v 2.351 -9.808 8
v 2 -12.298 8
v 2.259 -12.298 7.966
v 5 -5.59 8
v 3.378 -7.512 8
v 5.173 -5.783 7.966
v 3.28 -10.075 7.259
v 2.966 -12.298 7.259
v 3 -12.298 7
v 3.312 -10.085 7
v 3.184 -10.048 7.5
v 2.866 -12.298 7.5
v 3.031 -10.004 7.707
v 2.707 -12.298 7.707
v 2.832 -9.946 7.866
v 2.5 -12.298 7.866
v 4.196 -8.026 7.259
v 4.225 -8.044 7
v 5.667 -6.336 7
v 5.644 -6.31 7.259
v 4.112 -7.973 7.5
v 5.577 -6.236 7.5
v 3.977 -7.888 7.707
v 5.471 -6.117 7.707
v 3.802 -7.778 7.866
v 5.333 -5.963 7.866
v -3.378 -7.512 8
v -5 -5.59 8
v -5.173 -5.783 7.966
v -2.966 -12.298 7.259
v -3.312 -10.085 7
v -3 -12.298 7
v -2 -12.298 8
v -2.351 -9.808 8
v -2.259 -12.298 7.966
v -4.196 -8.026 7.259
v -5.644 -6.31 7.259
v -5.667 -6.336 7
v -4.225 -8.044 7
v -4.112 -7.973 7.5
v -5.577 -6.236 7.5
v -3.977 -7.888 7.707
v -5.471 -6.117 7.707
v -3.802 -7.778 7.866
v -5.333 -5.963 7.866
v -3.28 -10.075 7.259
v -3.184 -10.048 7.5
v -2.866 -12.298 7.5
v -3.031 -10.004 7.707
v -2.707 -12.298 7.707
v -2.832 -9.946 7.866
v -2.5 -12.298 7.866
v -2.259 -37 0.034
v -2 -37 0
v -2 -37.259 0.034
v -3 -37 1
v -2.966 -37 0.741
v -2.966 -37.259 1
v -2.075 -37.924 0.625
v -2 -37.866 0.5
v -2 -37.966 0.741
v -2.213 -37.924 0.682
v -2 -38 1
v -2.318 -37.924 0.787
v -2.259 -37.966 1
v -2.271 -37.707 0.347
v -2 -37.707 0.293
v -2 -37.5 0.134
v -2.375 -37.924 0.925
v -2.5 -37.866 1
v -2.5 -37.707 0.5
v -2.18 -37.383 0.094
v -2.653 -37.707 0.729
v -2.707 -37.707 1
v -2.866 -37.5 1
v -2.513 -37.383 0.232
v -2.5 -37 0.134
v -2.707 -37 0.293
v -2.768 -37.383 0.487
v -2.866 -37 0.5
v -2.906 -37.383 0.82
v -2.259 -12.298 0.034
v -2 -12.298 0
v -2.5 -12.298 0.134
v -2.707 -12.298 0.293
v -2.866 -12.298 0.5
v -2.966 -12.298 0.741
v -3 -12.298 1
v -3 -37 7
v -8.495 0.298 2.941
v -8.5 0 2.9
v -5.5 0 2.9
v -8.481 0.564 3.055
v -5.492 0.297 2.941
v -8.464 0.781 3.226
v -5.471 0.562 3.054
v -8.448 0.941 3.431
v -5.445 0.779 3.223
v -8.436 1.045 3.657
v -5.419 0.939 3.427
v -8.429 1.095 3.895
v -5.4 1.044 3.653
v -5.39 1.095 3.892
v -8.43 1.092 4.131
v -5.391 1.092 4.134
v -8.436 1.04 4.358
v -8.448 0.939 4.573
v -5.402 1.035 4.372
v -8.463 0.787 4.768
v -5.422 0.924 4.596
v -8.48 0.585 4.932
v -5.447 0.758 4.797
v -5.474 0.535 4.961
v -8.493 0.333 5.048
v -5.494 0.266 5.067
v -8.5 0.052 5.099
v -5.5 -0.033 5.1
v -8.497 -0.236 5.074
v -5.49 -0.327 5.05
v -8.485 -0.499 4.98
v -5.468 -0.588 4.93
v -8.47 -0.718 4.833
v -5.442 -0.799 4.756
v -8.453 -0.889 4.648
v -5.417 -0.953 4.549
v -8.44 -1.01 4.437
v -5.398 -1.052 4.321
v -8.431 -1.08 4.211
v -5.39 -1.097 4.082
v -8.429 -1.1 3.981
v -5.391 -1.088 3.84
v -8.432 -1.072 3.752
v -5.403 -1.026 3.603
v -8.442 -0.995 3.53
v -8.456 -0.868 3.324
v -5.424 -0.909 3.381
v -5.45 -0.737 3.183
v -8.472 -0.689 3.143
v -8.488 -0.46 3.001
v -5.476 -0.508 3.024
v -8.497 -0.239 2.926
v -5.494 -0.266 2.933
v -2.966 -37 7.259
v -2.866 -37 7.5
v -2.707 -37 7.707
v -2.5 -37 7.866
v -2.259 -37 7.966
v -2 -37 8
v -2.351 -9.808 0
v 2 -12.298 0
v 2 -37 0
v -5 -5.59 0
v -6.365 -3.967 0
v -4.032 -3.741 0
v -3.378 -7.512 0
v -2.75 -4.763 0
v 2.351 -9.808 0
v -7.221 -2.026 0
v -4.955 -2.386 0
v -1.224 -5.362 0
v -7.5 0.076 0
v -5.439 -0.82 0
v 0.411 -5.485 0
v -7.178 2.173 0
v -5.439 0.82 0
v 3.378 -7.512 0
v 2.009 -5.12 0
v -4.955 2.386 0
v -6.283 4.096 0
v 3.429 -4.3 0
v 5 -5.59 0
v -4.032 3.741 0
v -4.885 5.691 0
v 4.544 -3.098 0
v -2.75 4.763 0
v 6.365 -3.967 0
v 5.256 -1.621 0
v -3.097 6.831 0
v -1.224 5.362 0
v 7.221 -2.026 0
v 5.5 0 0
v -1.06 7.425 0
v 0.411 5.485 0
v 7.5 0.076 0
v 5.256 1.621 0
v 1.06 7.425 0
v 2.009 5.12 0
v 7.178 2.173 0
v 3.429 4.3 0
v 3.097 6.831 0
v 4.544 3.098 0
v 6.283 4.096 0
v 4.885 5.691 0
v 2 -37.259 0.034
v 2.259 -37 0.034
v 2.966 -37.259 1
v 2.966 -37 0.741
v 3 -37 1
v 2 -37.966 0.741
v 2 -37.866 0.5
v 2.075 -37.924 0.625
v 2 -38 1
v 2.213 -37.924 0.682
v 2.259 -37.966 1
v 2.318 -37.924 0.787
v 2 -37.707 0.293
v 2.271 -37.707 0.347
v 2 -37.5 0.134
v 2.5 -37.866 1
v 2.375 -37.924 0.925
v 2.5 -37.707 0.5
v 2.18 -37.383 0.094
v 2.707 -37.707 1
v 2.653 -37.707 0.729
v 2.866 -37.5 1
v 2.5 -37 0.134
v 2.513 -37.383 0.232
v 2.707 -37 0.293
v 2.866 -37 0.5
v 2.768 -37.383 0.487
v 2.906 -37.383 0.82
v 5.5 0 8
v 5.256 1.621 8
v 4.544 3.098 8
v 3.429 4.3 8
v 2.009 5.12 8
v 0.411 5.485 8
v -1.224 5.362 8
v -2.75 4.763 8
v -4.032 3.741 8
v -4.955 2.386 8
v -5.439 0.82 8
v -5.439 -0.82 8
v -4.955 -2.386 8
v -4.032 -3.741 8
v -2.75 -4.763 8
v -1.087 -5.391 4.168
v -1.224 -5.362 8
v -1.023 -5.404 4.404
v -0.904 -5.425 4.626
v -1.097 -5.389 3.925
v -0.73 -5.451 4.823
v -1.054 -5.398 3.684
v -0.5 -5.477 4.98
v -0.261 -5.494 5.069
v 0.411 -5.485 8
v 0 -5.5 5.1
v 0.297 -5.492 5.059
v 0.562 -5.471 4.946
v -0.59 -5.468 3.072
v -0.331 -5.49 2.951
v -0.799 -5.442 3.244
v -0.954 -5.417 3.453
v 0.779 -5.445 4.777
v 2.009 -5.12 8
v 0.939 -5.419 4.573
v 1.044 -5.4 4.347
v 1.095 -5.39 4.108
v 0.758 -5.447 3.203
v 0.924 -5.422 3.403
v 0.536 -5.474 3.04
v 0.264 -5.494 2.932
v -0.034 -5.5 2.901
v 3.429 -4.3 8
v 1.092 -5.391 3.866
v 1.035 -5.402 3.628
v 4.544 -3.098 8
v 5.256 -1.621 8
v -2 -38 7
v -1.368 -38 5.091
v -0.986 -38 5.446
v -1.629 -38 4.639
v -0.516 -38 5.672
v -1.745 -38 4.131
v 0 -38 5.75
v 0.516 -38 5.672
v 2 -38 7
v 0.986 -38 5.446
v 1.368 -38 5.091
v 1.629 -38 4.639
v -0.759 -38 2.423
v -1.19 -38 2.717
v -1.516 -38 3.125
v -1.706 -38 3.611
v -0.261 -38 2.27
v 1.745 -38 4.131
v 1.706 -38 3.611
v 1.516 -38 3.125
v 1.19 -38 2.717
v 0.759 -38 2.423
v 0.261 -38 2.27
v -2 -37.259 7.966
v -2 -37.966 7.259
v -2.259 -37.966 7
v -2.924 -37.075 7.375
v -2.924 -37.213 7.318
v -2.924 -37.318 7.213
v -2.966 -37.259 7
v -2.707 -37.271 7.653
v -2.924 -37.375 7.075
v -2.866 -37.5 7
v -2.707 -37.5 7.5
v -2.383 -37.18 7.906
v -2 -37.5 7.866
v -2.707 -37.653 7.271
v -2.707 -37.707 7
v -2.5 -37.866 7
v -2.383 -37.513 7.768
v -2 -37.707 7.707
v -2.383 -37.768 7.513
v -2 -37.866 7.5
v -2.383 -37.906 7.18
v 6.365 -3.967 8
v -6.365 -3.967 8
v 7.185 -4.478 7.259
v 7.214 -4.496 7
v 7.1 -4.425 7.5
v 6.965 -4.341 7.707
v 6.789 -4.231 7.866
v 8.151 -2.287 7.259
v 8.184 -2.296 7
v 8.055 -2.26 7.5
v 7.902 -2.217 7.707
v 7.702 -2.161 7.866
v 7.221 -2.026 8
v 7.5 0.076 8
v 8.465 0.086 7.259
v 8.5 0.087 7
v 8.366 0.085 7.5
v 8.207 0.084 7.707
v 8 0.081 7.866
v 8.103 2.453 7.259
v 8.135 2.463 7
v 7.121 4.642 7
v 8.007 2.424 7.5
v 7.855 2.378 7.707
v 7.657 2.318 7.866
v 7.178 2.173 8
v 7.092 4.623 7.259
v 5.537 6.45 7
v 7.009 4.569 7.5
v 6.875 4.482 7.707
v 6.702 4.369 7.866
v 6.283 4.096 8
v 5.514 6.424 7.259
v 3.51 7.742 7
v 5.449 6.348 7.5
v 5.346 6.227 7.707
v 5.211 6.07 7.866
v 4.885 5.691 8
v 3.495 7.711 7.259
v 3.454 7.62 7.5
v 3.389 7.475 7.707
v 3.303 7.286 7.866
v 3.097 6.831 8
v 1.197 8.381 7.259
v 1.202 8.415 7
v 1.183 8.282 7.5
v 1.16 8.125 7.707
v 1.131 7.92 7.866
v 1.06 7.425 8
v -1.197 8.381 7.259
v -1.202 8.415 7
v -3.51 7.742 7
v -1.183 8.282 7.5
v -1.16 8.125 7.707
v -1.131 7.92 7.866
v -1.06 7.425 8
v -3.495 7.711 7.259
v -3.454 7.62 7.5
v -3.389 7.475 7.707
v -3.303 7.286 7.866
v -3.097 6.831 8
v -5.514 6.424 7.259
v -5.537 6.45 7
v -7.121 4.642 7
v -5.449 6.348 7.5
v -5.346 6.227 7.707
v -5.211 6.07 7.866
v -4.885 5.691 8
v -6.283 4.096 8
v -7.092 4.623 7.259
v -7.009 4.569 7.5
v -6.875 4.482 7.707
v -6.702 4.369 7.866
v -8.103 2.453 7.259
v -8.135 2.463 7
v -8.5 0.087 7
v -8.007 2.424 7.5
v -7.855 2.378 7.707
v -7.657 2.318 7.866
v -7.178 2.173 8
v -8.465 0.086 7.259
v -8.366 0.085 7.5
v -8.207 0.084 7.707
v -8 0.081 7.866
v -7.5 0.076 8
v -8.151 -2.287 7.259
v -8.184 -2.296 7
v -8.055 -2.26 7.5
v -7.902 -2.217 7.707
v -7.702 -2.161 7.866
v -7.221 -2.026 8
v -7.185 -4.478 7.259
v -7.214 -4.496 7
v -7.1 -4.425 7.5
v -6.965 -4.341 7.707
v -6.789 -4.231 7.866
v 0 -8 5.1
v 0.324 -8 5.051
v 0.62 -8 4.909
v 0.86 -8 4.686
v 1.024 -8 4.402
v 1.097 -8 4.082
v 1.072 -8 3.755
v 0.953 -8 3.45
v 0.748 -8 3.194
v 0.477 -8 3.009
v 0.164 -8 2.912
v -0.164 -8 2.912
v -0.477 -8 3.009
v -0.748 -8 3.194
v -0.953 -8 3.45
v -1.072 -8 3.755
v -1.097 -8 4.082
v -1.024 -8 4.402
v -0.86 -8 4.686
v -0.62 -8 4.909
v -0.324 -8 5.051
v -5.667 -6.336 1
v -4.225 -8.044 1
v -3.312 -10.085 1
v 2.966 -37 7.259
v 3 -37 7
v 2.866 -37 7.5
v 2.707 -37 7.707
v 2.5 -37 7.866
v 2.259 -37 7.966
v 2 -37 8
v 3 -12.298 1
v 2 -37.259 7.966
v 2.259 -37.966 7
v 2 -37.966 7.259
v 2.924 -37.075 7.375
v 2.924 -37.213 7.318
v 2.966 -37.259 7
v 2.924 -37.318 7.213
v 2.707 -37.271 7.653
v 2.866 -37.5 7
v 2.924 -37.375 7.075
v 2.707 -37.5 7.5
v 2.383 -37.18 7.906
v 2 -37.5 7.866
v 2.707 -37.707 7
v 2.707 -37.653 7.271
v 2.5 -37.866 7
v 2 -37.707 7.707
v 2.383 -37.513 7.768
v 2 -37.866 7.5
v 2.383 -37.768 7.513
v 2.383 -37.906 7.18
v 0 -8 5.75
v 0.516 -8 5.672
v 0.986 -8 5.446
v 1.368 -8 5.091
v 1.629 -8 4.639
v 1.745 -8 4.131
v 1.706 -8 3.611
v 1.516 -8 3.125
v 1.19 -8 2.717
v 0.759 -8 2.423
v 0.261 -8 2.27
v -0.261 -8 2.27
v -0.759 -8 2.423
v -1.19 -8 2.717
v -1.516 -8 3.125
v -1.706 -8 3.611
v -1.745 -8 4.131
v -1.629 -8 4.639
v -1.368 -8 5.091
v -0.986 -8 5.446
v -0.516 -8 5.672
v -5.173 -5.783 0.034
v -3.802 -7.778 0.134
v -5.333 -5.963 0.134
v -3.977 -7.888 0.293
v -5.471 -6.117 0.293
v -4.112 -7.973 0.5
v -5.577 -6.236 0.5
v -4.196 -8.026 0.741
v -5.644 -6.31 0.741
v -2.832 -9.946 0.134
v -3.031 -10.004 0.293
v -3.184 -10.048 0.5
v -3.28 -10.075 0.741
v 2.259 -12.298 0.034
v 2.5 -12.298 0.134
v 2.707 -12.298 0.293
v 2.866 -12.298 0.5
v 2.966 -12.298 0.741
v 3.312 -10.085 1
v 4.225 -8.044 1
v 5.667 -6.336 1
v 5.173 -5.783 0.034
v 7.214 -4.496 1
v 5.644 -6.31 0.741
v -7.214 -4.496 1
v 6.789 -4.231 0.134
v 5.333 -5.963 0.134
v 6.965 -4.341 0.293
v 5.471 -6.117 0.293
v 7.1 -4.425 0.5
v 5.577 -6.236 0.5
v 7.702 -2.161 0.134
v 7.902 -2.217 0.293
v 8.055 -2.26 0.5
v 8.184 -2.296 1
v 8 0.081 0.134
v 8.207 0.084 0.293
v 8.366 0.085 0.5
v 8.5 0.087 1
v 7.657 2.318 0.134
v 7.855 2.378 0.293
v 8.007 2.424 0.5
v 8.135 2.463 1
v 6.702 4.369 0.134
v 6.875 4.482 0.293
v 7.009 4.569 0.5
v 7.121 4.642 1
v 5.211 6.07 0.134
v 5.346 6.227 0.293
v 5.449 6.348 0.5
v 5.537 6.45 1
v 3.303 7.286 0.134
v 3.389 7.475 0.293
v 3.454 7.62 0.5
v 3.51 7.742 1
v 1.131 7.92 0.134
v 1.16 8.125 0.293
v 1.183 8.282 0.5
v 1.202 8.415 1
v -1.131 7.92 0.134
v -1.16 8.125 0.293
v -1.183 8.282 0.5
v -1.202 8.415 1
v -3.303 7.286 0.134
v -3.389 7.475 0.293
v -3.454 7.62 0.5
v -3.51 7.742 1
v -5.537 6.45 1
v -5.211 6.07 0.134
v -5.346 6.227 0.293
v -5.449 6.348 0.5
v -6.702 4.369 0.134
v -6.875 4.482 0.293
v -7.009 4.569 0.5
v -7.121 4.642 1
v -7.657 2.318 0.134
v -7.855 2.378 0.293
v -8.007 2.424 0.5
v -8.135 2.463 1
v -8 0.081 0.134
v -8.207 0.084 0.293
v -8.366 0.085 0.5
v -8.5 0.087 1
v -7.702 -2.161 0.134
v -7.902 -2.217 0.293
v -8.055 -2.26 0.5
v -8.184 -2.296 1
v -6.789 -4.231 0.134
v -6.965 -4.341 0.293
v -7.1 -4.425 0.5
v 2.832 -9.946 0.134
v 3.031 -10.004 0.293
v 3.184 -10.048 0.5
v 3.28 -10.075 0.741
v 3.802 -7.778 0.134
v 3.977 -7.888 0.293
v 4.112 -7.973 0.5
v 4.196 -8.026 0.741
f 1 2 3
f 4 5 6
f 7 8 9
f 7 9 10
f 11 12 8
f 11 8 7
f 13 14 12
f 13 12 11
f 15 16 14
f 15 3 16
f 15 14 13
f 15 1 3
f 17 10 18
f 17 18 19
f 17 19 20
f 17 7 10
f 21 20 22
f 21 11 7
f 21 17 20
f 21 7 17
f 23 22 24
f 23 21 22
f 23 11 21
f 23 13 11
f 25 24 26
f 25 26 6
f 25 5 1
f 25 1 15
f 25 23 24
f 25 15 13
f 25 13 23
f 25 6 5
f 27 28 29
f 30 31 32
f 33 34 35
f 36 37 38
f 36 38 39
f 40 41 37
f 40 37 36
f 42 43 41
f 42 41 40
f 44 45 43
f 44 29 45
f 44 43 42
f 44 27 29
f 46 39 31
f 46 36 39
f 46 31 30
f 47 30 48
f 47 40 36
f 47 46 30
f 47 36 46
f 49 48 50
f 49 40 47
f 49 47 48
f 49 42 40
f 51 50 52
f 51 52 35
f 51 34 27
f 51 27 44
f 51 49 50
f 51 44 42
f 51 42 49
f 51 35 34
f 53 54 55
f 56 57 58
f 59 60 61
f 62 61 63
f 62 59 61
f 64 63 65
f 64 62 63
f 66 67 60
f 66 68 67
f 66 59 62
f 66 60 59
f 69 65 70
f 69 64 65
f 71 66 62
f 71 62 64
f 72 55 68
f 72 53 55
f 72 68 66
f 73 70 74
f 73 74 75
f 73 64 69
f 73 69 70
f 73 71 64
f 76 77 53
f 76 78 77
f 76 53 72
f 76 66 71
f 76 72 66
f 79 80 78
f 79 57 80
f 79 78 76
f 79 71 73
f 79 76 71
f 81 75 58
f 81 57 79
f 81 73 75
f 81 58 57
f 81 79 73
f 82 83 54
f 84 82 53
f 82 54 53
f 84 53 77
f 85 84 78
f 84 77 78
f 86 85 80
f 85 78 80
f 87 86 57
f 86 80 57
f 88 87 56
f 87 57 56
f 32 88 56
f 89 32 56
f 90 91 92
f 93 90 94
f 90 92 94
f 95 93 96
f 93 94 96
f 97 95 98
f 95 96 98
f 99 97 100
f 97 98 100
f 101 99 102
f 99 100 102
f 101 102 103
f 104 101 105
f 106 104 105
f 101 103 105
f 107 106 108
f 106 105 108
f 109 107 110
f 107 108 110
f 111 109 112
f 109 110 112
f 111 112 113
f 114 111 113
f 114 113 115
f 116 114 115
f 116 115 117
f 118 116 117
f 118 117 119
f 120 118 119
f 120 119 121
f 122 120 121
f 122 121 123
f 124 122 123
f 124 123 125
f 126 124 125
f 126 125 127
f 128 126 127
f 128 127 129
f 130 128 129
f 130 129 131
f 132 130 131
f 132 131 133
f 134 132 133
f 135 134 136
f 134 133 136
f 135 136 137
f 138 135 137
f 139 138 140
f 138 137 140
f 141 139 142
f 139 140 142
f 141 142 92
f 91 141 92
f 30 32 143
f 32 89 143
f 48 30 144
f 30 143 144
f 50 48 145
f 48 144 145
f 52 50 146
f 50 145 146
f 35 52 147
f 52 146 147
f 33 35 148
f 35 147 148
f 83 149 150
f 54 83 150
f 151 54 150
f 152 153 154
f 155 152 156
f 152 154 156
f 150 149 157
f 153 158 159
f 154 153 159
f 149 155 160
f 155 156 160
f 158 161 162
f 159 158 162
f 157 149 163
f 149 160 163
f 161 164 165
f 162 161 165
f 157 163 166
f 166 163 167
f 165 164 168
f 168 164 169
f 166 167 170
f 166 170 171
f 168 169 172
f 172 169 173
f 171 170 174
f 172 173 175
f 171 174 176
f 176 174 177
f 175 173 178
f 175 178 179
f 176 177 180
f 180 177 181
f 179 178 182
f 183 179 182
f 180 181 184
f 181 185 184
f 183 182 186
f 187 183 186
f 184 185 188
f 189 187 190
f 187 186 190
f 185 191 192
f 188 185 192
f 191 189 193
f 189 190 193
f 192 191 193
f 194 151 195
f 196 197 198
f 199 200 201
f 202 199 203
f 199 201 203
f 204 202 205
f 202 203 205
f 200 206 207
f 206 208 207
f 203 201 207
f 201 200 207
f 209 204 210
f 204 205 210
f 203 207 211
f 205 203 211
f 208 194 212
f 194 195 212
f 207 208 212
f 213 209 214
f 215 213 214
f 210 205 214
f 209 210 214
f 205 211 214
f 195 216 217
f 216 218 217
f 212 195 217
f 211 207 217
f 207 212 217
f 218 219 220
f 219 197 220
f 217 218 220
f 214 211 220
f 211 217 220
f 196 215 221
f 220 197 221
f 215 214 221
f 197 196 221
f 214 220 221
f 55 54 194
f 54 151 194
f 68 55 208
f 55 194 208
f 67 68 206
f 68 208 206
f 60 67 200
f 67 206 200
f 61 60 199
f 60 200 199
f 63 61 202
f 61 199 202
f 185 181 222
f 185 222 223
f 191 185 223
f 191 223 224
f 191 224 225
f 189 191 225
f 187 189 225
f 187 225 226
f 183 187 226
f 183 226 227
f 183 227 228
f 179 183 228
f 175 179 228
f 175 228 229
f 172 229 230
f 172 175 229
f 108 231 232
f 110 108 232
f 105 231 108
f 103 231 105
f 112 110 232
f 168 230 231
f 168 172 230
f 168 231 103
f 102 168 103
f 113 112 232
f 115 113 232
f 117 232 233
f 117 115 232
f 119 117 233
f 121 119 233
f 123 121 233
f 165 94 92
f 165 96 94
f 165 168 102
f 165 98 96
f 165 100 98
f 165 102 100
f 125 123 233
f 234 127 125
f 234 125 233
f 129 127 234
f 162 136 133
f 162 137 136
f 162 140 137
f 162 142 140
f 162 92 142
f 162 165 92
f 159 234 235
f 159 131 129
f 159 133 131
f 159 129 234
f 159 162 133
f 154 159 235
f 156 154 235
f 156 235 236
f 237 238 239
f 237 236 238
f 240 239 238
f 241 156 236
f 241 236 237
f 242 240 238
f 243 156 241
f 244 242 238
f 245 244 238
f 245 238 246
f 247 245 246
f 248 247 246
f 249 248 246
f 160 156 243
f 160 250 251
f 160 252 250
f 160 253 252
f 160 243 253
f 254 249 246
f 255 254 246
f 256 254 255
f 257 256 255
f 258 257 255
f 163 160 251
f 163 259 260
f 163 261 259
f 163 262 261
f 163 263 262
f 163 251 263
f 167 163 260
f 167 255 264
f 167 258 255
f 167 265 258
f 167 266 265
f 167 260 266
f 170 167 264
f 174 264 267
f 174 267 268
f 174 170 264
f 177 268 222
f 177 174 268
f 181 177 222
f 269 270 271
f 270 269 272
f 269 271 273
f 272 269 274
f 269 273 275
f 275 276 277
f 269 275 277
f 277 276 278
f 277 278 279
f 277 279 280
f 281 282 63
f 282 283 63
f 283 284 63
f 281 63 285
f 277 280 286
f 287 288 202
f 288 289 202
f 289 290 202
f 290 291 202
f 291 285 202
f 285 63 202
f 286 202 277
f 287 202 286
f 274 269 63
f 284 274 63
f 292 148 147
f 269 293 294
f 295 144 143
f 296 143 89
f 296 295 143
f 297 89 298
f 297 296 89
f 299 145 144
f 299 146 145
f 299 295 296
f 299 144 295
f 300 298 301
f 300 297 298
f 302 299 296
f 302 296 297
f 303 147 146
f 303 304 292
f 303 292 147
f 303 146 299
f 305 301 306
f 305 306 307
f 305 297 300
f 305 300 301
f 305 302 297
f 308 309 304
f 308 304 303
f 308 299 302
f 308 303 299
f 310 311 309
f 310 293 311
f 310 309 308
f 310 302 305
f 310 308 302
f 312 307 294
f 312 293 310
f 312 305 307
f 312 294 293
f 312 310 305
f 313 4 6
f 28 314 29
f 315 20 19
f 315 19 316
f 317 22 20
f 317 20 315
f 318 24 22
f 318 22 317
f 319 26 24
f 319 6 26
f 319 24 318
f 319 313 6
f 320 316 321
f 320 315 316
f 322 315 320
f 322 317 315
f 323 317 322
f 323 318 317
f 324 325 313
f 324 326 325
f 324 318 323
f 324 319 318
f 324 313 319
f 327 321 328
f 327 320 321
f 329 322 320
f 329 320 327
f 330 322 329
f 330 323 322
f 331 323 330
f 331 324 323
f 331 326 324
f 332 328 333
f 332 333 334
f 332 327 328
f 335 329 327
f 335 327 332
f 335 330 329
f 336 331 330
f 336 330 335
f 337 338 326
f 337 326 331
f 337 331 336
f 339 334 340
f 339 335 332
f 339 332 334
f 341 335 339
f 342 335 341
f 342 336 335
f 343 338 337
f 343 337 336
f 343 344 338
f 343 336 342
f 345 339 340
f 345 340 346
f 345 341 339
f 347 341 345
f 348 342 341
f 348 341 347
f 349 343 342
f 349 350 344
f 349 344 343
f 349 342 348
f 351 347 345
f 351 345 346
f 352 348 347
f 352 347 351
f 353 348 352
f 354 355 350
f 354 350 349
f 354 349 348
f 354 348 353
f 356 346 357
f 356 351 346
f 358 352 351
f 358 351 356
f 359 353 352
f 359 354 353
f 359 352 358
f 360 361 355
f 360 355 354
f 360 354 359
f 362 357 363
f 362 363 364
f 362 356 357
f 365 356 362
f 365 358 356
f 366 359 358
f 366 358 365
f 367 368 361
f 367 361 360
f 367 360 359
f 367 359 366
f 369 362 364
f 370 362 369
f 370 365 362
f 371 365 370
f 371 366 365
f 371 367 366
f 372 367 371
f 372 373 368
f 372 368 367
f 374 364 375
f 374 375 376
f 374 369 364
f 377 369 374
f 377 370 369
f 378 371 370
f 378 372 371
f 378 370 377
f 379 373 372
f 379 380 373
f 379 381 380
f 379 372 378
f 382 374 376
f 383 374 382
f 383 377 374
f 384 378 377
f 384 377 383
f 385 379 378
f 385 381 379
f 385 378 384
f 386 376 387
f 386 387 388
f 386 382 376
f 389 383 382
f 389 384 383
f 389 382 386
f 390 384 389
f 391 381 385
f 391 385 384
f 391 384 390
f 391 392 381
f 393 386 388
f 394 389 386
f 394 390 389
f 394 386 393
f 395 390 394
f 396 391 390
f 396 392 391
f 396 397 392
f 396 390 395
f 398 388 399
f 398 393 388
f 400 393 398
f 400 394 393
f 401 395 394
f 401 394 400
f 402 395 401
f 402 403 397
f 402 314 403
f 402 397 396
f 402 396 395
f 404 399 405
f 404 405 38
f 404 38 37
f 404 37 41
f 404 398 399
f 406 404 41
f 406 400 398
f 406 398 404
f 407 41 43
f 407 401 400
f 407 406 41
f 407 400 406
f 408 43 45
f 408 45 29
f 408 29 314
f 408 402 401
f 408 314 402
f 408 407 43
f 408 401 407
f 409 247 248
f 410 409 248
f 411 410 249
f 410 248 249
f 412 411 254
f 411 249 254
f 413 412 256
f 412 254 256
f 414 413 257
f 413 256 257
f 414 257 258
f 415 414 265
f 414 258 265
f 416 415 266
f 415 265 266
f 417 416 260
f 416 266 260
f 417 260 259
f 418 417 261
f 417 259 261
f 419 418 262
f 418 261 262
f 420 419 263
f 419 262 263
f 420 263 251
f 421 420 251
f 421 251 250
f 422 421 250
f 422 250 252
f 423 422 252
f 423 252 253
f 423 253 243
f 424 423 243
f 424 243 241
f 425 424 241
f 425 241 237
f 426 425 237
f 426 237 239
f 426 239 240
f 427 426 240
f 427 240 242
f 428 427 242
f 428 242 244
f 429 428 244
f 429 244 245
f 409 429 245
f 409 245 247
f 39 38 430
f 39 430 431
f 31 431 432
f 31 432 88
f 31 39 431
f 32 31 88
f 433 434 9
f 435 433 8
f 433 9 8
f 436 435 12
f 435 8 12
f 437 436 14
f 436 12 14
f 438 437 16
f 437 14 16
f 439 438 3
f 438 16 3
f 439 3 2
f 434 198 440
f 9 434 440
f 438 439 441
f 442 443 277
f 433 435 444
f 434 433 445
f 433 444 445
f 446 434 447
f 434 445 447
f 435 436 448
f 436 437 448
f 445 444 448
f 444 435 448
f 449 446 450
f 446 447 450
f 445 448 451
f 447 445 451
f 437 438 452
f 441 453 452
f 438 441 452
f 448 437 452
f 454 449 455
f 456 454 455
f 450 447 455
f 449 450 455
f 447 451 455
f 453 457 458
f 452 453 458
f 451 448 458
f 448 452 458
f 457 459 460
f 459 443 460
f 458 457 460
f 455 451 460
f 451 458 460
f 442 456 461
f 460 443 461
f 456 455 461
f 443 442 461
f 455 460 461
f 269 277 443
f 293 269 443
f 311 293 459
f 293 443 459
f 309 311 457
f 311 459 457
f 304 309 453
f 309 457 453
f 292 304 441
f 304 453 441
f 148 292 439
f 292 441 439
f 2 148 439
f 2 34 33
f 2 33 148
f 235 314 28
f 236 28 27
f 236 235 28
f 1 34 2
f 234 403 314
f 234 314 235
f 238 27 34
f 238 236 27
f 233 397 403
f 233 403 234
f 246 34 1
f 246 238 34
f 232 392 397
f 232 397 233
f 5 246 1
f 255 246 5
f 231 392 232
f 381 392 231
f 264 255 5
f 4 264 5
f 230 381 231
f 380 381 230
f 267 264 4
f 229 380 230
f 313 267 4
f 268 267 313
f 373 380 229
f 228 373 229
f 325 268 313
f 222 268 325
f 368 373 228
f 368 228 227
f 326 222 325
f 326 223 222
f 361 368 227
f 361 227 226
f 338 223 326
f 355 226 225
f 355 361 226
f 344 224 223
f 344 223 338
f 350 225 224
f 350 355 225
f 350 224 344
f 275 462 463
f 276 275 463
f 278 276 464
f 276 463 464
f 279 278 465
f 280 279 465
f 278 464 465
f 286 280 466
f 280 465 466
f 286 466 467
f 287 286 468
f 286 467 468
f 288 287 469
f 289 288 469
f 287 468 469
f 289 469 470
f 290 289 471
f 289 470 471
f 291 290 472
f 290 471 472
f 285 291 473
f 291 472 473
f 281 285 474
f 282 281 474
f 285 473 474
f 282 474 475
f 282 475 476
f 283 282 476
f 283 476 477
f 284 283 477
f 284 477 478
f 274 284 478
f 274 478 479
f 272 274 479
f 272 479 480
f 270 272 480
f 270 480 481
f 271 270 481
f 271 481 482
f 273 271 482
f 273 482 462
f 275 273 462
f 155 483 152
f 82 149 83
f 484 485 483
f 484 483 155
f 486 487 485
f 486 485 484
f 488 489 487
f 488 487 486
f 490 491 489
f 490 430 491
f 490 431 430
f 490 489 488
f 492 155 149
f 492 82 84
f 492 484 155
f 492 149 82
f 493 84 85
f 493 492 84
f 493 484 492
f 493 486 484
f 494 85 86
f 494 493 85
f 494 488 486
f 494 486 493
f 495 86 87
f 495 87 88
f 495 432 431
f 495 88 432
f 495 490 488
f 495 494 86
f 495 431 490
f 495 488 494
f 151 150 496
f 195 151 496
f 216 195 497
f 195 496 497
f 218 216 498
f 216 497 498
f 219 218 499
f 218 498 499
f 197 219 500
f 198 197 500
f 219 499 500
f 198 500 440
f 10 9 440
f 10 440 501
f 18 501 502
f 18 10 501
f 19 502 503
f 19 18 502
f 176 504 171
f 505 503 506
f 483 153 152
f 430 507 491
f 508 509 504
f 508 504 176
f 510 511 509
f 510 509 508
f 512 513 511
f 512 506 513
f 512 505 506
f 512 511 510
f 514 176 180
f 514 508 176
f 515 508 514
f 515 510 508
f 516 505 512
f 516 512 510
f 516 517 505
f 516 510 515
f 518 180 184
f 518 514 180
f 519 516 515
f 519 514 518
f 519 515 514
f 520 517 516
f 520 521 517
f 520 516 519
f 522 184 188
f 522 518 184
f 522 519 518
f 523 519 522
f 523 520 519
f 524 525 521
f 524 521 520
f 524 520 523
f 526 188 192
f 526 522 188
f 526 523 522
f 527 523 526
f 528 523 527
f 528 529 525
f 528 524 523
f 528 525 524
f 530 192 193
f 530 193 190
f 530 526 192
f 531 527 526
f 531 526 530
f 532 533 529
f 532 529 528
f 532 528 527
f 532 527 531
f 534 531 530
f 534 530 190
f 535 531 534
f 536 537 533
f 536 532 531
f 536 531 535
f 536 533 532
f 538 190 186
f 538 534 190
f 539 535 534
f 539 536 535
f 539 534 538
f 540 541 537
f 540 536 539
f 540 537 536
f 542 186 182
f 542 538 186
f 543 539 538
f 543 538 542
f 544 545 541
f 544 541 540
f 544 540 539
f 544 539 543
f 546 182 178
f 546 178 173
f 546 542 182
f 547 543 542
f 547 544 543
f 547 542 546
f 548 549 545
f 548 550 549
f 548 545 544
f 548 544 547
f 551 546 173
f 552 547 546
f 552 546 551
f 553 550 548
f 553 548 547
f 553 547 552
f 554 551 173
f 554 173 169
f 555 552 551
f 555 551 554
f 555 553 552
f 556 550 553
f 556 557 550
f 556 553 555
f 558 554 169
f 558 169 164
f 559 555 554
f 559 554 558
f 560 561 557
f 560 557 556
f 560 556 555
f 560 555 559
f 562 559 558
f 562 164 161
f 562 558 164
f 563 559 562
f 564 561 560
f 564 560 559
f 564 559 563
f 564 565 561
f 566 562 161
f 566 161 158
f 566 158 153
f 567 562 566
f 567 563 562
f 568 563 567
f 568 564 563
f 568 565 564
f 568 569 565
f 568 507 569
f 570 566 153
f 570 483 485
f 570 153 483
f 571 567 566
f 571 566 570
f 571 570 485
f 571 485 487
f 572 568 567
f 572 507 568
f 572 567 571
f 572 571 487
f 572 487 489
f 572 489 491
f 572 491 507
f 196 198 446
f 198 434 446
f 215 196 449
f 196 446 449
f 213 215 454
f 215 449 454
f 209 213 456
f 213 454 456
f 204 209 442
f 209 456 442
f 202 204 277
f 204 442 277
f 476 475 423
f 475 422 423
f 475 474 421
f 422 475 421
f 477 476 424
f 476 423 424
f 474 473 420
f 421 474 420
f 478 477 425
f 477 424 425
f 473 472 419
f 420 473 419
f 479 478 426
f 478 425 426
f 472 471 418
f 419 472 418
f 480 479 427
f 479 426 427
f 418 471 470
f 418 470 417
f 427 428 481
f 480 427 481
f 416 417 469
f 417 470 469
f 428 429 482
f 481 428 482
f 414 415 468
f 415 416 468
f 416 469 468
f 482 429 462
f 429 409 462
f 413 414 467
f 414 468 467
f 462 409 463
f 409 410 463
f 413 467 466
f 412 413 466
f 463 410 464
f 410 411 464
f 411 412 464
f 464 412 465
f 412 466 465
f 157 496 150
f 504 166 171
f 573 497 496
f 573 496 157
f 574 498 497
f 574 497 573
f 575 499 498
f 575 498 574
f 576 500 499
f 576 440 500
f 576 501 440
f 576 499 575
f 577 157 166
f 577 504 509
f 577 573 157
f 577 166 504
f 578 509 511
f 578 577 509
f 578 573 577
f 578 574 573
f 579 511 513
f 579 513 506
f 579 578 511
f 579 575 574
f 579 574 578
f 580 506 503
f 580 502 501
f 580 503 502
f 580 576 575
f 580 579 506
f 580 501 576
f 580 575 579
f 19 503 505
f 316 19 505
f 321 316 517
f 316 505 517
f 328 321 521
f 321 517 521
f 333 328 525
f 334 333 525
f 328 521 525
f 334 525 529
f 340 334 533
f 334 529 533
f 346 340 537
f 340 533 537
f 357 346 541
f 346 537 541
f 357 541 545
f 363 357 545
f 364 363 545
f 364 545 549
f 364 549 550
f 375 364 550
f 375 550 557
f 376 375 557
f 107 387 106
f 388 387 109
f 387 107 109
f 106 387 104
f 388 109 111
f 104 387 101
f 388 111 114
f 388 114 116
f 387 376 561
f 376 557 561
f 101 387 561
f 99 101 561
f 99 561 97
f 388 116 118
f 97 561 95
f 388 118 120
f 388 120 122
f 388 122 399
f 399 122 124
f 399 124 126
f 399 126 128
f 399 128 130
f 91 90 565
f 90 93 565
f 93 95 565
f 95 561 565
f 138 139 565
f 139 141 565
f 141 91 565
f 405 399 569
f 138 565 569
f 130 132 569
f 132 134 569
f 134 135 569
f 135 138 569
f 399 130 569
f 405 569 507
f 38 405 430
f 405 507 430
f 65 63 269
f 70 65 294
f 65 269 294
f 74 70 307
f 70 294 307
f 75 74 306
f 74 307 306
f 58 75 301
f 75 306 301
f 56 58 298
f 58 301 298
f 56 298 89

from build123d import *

# Parameters (mm, degrees)
SKETCH2_R           = 5.5
BOSS_EXTRUDE1_DEPTH = 8
SKETCH3_R           = 1.1
CUT_EXTRUDE1_DEPTH  = 40.752358421
CUT_EXTRUDE2_START  = -8
SKETCH5_R           = 1.75
CUT_EXTRUDE2_DEPTH  = 88
SKETCH6_R           = 1.1
CUT_EXTRUDE3_DEPTH  = 40.752358441
FILLET2_R           = 8
FILLET1_R           = 1


with BuildPart() as part:
    # Sketch2 → Boss-Extrude1 (new body)
    with BuildSketch(Plane.XY):
        with BuildLine():
            Line((0, -38), (3, -38))
            Line((3, -38), (3, -7.95298686))
            ThreePointArc((3, -7.95298686), (0, 8.5), (-3, -7.95298686))
            Line((-3, -7.95298686), (-3, -38))
            Line((-3, -38), (0, -38))
        make_face()
        Circle(SKETCH2_R, mode=Mode.SUBTRACT)
    extrude(amount=BOSS_EXTRUDE1_DEPTH)

    # Sketch3 → Cut-Extrude1 (cut, through all)
    with BuildSketch(Plane(origin=(0, 0, 0), x_dir=(1, 0, 0), z_dir=(0, 1, 0))):
        with Locations(Location((0, -4, 0), (0, 0, 270))):
            Circle(SKETCH3_R)
    extrude(amount=-CUT_EXTRUDE1_DEPTH, mode=Mode.SUBTRACT)

    # Sketch5 → Cut-Extrude2 (cut)
    with BuildSketch(Plane(origin=(0, 0, 0), x_dir=(1, 0, 0), z_dir=(0, 1, 0)).offset(CUT_EXTRUDE2_START)):
        with Locations(Location((0, -4, 0), (0, 0, 270))):
            Circle(SKETCH5_R)
    extrude(amount=-CUT_EXTRUDE2_DEPTH, mode=Mode.SUBTRACT)

    # Sketch6 → Cut-Extrude3 (cut, through all)
    with BuildSketch(Plane(origin=(0, 0, 0), x_dir=(0, 0, -1), z_dir=(1, 0, 0))):
        with Locations((-4, 0)):
            Circle(SKETCH6_R)
    extrude(amount=-CUT_EXTRUDE3_DEPTH, mode=Mode.SUBTRACT)

    # Fillet2
    fillet2_edges = [part.edges().sort_by_distance(p)[0] for p in [
        (3, -7.95298686, 4),
        (-3, -7.95298686, 4),
    ]]
    fillet(fillet2_edges, radius=FILLET2_R)

    # Fillet1
    fillet1_edges = [part.edges().sort_by_distance(p)[0] for p in [
        (0, -38, 8),
        (3, -25.149186938, 8),
        (0, 8.5, 0),
        (0, 8.5, 8),
        (-3, -25.149186938, 0),
        (-3, -25.149186938, 8),
        (3.697032567, -9.032387553, 0),
        (3.697032567, -9.032387553, 8),
        (-3.697032567, -9.032387553, 0),
        (-3.697032567, -9.032387553, 8),
        (3, -25.149186938, 0),
        (0, -38, 0),
        (3, -38, 4),
        (-3, -38, 4),
    ]]
    fillet(fillet1_edges, radius=FILLET1_R)


solid = part.part
